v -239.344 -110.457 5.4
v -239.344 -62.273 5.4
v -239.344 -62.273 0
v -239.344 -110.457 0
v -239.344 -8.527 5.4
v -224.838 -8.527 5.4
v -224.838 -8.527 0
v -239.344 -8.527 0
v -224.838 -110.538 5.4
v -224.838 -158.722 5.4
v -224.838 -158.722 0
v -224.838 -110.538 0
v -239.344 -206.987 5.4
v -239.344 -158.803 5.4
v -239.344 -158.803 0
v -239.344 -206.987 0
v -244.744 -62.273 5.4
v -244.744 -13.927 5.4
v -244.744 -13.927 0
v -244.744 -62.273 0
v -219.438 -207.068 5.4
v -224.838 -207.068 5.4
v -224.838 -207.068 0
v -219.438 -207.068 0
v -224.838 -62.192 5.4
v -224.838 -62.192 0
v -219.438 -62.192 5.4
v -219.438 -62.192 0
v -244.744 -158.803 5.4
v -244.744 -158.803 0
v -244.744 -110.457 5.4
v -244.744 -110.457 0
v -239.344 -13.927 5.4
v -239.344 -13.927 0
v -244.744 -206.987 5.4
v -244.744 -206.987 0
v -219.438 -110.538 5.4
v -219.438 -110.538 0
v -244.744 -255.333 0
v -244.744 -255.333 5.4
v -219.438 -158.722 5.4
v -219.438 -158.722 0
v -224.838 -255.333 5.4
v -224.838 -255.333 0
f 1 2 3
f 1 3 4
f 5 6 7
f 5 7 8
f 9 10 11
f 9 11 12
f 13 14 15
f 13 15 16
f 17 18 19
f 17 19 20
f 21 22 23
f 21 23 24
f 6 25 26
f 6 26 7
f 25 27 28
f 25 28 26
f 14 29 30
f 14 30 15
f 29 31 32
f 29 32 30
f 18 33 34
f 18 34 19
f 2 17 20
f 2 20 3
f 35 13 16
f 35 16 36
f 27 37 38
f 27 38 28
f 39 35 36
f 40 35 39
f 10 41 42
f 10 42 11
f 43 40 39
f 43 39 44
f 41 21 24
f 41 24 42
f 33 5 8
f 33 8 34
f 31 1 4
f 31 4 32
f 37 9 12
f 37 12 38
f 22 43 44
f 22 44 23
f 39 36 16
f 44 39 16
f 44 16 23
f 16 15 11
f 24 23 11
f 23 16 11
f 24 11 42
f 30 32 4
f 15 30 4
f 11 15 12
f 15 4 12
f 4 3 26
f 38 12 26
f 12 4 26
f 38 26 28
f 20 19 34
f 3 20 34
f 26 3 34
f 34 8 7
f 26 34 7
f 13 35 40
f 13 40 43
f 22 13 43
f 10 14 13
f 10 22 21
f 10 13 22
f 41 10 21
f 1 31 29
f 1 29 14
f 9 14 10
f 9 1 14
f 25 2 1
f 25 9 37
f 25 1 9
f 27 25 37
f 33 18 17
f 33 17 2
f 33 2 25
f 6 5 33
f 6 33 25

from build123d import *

# Parameters (mm, degrees)
BOSS_EXTRUDE1_DEPTH = 5.4
BOSS_EXTRUDE2_DEPTH = 5.4


with BuildPart() as part:
    # Sketch1 → Boss-Extrude1 (new body)
    with BuildSketch(Plane.XY):
        Polygon((-239.303382108, -8.567555325), (-239.303382108, -13.967555325), (-244.703382108, -13.967555325), (-244.703382108, -62.232555325), (-239.303382108, -62.232555325), (-239.303382108, -110.497555325), (-244.703382108, -110.497555325), (-244.703382108, -158.762555325), (-239.303382108, -158.762555325), (-239.303382108, -207.027555325), (-244.703382108, -207.027555325), (-244.703382108, -255.292555325), (-224.878382108, -255.292555325), (-224.878382108, -207.027555325), (-219.478382108, -207.027555325), (-219.478382108, -158.762555325), (-224.878382108, -158.762555325), (-224.878382108, -110.497555325), (-219.478382108, -110.497555325), (-219.478382108, -62.232555325), (-224.878382108, -62.232555325), (-224.878382108, -8.567555325), align=None)
    extrude(amount=BOSS_EXTRUDE1_DEPTH)

    # Sketch2 → Boss-Extrude2 (add)
    with BuildSketch(Plane.XY.offset(5.4)):
        Polygon((-239.344022108, -8.526915325), (-239.344022108, -13.926915325), (-244.744022108, -13.926915325), (-244.744022108, -62.273195325), (-239.344022108, -62.273195325), (-239.344022108, -110.456915325), (-244.744022108, -110.456915325), (-244.744022108, -158.803195325), (-239.344022108, -158.803195325), (-239.344022108, -206.986915325), (-244.744022108, -206.986915325), (-244.744022108, -255.333195325), (-224.837742108, -255.333195325), (-224.837742108, -207.068195325), (-219.437742108, -207.068195325), (-219.437742108, -158.721915325), (-224.837742108, -158.721915325), (-224.837742108, -110.538195325), (-219.437742108, -110.538195325), (-219.437742108, -62.191915325), (-224.837742108, -62.191915325), (-224.837742108, -8.526915325), align=None)
    extrude(amount=-BOSS_EXTRUDE2_DEPTH)


solid = part.part
